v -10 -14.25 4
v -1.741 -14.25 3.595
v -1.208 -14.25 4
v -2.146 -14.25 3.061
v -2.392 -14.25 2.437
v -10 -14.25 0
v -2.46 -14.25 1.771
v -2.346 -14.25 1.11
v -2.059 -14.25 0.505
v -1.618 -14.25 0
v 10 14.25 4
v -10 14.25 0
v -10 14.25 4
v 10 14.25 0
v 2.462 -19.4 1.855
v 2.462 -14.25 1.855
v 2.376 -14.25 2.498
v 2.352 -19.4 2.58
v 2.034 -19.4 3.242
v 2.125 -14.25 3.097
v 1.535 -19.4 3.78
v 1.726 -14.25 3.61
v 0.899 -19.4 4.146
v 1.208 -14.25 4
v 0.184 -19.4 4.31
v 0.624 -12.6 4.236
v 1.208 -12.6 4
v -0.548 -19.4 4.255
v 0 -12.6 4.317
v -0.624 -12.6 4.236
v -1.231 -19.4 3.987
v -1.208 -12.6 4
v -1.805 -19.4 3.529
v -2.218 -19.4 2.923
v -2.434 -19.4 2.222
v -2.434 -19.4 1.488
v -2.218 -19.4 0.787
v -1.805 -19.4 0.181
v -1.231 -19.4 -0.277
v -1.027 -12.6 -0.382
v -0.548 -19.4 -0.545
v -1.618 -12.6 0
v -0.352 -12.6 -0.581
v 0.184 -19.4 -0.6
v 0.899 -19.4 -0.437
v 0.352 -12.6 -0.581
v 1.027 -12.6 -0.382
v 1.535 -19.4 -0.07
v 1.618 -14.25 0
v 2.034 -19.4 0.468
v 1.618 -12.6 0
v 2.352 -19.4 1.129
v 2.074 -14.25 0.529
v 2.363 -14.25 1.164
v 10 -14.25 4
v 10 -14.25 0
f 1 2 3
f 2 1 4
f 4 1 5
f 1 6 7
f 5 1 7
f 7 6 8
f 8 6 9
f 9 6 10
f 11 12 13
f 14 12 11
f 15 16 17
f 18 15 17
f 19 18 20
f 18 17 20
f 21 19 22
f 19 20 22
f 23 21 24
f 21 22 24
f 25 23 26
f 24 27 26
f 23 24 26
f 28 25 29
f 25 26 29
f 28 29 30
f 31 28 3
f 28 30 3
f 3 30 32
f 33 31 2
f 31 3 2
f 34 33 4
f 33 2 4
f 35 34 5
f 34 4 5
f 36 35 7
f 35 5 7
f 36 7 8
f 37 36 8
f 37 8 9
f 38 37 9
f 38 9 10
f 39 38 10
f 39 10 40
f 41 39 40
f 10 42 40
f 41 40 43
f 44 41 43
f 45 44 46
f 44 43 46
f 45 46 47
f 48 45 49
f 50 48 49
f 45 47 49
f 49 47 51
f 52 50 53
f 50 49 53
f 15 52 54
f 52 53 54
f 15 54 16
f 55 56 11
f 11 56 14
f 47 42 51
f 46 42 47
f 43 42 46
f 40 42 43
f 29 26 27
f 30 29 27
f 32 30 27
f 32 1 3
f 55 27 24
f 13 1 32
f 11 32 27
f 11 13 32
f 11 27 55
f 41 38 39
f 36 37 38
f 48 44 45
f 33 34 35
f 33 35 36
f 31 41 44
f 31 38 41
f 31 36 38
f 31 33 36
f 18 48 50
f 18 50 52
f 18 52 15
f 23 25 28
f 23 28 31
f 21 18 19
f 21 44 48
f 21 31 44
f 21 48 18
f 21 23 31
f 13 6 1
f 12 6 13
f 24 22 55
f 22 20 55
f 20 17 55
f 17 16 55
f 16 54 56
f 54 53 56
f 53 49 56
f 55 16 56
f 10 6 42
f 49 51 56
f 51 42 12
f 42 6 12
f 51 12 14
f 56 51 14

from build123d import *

# Parameters (mm, degrees)
F0_W     = 20
F0_H     = 28.5
F1_DEPTH = 4
F3_START = 12.6
F2_R     = 2.4616630518
F3_DEPTH = 6.8


with BuildPart() as f1:
    # F0 (on Top) → F1 (new body)
    with BuildSketch(Plane.XY):
        Rectangle(F0_W, F0_H)
    extrude(amount=F1_DEPTH)

    # F2 (on Front) → F3 (join)
    with BuildSketch(Plane.XZ.offset(F3_START)):
        with Locations((0, 1.8549020169)):
            Circle(F2_R)
    extrude(amount=F3_DEPTH)


solid = f1.part
